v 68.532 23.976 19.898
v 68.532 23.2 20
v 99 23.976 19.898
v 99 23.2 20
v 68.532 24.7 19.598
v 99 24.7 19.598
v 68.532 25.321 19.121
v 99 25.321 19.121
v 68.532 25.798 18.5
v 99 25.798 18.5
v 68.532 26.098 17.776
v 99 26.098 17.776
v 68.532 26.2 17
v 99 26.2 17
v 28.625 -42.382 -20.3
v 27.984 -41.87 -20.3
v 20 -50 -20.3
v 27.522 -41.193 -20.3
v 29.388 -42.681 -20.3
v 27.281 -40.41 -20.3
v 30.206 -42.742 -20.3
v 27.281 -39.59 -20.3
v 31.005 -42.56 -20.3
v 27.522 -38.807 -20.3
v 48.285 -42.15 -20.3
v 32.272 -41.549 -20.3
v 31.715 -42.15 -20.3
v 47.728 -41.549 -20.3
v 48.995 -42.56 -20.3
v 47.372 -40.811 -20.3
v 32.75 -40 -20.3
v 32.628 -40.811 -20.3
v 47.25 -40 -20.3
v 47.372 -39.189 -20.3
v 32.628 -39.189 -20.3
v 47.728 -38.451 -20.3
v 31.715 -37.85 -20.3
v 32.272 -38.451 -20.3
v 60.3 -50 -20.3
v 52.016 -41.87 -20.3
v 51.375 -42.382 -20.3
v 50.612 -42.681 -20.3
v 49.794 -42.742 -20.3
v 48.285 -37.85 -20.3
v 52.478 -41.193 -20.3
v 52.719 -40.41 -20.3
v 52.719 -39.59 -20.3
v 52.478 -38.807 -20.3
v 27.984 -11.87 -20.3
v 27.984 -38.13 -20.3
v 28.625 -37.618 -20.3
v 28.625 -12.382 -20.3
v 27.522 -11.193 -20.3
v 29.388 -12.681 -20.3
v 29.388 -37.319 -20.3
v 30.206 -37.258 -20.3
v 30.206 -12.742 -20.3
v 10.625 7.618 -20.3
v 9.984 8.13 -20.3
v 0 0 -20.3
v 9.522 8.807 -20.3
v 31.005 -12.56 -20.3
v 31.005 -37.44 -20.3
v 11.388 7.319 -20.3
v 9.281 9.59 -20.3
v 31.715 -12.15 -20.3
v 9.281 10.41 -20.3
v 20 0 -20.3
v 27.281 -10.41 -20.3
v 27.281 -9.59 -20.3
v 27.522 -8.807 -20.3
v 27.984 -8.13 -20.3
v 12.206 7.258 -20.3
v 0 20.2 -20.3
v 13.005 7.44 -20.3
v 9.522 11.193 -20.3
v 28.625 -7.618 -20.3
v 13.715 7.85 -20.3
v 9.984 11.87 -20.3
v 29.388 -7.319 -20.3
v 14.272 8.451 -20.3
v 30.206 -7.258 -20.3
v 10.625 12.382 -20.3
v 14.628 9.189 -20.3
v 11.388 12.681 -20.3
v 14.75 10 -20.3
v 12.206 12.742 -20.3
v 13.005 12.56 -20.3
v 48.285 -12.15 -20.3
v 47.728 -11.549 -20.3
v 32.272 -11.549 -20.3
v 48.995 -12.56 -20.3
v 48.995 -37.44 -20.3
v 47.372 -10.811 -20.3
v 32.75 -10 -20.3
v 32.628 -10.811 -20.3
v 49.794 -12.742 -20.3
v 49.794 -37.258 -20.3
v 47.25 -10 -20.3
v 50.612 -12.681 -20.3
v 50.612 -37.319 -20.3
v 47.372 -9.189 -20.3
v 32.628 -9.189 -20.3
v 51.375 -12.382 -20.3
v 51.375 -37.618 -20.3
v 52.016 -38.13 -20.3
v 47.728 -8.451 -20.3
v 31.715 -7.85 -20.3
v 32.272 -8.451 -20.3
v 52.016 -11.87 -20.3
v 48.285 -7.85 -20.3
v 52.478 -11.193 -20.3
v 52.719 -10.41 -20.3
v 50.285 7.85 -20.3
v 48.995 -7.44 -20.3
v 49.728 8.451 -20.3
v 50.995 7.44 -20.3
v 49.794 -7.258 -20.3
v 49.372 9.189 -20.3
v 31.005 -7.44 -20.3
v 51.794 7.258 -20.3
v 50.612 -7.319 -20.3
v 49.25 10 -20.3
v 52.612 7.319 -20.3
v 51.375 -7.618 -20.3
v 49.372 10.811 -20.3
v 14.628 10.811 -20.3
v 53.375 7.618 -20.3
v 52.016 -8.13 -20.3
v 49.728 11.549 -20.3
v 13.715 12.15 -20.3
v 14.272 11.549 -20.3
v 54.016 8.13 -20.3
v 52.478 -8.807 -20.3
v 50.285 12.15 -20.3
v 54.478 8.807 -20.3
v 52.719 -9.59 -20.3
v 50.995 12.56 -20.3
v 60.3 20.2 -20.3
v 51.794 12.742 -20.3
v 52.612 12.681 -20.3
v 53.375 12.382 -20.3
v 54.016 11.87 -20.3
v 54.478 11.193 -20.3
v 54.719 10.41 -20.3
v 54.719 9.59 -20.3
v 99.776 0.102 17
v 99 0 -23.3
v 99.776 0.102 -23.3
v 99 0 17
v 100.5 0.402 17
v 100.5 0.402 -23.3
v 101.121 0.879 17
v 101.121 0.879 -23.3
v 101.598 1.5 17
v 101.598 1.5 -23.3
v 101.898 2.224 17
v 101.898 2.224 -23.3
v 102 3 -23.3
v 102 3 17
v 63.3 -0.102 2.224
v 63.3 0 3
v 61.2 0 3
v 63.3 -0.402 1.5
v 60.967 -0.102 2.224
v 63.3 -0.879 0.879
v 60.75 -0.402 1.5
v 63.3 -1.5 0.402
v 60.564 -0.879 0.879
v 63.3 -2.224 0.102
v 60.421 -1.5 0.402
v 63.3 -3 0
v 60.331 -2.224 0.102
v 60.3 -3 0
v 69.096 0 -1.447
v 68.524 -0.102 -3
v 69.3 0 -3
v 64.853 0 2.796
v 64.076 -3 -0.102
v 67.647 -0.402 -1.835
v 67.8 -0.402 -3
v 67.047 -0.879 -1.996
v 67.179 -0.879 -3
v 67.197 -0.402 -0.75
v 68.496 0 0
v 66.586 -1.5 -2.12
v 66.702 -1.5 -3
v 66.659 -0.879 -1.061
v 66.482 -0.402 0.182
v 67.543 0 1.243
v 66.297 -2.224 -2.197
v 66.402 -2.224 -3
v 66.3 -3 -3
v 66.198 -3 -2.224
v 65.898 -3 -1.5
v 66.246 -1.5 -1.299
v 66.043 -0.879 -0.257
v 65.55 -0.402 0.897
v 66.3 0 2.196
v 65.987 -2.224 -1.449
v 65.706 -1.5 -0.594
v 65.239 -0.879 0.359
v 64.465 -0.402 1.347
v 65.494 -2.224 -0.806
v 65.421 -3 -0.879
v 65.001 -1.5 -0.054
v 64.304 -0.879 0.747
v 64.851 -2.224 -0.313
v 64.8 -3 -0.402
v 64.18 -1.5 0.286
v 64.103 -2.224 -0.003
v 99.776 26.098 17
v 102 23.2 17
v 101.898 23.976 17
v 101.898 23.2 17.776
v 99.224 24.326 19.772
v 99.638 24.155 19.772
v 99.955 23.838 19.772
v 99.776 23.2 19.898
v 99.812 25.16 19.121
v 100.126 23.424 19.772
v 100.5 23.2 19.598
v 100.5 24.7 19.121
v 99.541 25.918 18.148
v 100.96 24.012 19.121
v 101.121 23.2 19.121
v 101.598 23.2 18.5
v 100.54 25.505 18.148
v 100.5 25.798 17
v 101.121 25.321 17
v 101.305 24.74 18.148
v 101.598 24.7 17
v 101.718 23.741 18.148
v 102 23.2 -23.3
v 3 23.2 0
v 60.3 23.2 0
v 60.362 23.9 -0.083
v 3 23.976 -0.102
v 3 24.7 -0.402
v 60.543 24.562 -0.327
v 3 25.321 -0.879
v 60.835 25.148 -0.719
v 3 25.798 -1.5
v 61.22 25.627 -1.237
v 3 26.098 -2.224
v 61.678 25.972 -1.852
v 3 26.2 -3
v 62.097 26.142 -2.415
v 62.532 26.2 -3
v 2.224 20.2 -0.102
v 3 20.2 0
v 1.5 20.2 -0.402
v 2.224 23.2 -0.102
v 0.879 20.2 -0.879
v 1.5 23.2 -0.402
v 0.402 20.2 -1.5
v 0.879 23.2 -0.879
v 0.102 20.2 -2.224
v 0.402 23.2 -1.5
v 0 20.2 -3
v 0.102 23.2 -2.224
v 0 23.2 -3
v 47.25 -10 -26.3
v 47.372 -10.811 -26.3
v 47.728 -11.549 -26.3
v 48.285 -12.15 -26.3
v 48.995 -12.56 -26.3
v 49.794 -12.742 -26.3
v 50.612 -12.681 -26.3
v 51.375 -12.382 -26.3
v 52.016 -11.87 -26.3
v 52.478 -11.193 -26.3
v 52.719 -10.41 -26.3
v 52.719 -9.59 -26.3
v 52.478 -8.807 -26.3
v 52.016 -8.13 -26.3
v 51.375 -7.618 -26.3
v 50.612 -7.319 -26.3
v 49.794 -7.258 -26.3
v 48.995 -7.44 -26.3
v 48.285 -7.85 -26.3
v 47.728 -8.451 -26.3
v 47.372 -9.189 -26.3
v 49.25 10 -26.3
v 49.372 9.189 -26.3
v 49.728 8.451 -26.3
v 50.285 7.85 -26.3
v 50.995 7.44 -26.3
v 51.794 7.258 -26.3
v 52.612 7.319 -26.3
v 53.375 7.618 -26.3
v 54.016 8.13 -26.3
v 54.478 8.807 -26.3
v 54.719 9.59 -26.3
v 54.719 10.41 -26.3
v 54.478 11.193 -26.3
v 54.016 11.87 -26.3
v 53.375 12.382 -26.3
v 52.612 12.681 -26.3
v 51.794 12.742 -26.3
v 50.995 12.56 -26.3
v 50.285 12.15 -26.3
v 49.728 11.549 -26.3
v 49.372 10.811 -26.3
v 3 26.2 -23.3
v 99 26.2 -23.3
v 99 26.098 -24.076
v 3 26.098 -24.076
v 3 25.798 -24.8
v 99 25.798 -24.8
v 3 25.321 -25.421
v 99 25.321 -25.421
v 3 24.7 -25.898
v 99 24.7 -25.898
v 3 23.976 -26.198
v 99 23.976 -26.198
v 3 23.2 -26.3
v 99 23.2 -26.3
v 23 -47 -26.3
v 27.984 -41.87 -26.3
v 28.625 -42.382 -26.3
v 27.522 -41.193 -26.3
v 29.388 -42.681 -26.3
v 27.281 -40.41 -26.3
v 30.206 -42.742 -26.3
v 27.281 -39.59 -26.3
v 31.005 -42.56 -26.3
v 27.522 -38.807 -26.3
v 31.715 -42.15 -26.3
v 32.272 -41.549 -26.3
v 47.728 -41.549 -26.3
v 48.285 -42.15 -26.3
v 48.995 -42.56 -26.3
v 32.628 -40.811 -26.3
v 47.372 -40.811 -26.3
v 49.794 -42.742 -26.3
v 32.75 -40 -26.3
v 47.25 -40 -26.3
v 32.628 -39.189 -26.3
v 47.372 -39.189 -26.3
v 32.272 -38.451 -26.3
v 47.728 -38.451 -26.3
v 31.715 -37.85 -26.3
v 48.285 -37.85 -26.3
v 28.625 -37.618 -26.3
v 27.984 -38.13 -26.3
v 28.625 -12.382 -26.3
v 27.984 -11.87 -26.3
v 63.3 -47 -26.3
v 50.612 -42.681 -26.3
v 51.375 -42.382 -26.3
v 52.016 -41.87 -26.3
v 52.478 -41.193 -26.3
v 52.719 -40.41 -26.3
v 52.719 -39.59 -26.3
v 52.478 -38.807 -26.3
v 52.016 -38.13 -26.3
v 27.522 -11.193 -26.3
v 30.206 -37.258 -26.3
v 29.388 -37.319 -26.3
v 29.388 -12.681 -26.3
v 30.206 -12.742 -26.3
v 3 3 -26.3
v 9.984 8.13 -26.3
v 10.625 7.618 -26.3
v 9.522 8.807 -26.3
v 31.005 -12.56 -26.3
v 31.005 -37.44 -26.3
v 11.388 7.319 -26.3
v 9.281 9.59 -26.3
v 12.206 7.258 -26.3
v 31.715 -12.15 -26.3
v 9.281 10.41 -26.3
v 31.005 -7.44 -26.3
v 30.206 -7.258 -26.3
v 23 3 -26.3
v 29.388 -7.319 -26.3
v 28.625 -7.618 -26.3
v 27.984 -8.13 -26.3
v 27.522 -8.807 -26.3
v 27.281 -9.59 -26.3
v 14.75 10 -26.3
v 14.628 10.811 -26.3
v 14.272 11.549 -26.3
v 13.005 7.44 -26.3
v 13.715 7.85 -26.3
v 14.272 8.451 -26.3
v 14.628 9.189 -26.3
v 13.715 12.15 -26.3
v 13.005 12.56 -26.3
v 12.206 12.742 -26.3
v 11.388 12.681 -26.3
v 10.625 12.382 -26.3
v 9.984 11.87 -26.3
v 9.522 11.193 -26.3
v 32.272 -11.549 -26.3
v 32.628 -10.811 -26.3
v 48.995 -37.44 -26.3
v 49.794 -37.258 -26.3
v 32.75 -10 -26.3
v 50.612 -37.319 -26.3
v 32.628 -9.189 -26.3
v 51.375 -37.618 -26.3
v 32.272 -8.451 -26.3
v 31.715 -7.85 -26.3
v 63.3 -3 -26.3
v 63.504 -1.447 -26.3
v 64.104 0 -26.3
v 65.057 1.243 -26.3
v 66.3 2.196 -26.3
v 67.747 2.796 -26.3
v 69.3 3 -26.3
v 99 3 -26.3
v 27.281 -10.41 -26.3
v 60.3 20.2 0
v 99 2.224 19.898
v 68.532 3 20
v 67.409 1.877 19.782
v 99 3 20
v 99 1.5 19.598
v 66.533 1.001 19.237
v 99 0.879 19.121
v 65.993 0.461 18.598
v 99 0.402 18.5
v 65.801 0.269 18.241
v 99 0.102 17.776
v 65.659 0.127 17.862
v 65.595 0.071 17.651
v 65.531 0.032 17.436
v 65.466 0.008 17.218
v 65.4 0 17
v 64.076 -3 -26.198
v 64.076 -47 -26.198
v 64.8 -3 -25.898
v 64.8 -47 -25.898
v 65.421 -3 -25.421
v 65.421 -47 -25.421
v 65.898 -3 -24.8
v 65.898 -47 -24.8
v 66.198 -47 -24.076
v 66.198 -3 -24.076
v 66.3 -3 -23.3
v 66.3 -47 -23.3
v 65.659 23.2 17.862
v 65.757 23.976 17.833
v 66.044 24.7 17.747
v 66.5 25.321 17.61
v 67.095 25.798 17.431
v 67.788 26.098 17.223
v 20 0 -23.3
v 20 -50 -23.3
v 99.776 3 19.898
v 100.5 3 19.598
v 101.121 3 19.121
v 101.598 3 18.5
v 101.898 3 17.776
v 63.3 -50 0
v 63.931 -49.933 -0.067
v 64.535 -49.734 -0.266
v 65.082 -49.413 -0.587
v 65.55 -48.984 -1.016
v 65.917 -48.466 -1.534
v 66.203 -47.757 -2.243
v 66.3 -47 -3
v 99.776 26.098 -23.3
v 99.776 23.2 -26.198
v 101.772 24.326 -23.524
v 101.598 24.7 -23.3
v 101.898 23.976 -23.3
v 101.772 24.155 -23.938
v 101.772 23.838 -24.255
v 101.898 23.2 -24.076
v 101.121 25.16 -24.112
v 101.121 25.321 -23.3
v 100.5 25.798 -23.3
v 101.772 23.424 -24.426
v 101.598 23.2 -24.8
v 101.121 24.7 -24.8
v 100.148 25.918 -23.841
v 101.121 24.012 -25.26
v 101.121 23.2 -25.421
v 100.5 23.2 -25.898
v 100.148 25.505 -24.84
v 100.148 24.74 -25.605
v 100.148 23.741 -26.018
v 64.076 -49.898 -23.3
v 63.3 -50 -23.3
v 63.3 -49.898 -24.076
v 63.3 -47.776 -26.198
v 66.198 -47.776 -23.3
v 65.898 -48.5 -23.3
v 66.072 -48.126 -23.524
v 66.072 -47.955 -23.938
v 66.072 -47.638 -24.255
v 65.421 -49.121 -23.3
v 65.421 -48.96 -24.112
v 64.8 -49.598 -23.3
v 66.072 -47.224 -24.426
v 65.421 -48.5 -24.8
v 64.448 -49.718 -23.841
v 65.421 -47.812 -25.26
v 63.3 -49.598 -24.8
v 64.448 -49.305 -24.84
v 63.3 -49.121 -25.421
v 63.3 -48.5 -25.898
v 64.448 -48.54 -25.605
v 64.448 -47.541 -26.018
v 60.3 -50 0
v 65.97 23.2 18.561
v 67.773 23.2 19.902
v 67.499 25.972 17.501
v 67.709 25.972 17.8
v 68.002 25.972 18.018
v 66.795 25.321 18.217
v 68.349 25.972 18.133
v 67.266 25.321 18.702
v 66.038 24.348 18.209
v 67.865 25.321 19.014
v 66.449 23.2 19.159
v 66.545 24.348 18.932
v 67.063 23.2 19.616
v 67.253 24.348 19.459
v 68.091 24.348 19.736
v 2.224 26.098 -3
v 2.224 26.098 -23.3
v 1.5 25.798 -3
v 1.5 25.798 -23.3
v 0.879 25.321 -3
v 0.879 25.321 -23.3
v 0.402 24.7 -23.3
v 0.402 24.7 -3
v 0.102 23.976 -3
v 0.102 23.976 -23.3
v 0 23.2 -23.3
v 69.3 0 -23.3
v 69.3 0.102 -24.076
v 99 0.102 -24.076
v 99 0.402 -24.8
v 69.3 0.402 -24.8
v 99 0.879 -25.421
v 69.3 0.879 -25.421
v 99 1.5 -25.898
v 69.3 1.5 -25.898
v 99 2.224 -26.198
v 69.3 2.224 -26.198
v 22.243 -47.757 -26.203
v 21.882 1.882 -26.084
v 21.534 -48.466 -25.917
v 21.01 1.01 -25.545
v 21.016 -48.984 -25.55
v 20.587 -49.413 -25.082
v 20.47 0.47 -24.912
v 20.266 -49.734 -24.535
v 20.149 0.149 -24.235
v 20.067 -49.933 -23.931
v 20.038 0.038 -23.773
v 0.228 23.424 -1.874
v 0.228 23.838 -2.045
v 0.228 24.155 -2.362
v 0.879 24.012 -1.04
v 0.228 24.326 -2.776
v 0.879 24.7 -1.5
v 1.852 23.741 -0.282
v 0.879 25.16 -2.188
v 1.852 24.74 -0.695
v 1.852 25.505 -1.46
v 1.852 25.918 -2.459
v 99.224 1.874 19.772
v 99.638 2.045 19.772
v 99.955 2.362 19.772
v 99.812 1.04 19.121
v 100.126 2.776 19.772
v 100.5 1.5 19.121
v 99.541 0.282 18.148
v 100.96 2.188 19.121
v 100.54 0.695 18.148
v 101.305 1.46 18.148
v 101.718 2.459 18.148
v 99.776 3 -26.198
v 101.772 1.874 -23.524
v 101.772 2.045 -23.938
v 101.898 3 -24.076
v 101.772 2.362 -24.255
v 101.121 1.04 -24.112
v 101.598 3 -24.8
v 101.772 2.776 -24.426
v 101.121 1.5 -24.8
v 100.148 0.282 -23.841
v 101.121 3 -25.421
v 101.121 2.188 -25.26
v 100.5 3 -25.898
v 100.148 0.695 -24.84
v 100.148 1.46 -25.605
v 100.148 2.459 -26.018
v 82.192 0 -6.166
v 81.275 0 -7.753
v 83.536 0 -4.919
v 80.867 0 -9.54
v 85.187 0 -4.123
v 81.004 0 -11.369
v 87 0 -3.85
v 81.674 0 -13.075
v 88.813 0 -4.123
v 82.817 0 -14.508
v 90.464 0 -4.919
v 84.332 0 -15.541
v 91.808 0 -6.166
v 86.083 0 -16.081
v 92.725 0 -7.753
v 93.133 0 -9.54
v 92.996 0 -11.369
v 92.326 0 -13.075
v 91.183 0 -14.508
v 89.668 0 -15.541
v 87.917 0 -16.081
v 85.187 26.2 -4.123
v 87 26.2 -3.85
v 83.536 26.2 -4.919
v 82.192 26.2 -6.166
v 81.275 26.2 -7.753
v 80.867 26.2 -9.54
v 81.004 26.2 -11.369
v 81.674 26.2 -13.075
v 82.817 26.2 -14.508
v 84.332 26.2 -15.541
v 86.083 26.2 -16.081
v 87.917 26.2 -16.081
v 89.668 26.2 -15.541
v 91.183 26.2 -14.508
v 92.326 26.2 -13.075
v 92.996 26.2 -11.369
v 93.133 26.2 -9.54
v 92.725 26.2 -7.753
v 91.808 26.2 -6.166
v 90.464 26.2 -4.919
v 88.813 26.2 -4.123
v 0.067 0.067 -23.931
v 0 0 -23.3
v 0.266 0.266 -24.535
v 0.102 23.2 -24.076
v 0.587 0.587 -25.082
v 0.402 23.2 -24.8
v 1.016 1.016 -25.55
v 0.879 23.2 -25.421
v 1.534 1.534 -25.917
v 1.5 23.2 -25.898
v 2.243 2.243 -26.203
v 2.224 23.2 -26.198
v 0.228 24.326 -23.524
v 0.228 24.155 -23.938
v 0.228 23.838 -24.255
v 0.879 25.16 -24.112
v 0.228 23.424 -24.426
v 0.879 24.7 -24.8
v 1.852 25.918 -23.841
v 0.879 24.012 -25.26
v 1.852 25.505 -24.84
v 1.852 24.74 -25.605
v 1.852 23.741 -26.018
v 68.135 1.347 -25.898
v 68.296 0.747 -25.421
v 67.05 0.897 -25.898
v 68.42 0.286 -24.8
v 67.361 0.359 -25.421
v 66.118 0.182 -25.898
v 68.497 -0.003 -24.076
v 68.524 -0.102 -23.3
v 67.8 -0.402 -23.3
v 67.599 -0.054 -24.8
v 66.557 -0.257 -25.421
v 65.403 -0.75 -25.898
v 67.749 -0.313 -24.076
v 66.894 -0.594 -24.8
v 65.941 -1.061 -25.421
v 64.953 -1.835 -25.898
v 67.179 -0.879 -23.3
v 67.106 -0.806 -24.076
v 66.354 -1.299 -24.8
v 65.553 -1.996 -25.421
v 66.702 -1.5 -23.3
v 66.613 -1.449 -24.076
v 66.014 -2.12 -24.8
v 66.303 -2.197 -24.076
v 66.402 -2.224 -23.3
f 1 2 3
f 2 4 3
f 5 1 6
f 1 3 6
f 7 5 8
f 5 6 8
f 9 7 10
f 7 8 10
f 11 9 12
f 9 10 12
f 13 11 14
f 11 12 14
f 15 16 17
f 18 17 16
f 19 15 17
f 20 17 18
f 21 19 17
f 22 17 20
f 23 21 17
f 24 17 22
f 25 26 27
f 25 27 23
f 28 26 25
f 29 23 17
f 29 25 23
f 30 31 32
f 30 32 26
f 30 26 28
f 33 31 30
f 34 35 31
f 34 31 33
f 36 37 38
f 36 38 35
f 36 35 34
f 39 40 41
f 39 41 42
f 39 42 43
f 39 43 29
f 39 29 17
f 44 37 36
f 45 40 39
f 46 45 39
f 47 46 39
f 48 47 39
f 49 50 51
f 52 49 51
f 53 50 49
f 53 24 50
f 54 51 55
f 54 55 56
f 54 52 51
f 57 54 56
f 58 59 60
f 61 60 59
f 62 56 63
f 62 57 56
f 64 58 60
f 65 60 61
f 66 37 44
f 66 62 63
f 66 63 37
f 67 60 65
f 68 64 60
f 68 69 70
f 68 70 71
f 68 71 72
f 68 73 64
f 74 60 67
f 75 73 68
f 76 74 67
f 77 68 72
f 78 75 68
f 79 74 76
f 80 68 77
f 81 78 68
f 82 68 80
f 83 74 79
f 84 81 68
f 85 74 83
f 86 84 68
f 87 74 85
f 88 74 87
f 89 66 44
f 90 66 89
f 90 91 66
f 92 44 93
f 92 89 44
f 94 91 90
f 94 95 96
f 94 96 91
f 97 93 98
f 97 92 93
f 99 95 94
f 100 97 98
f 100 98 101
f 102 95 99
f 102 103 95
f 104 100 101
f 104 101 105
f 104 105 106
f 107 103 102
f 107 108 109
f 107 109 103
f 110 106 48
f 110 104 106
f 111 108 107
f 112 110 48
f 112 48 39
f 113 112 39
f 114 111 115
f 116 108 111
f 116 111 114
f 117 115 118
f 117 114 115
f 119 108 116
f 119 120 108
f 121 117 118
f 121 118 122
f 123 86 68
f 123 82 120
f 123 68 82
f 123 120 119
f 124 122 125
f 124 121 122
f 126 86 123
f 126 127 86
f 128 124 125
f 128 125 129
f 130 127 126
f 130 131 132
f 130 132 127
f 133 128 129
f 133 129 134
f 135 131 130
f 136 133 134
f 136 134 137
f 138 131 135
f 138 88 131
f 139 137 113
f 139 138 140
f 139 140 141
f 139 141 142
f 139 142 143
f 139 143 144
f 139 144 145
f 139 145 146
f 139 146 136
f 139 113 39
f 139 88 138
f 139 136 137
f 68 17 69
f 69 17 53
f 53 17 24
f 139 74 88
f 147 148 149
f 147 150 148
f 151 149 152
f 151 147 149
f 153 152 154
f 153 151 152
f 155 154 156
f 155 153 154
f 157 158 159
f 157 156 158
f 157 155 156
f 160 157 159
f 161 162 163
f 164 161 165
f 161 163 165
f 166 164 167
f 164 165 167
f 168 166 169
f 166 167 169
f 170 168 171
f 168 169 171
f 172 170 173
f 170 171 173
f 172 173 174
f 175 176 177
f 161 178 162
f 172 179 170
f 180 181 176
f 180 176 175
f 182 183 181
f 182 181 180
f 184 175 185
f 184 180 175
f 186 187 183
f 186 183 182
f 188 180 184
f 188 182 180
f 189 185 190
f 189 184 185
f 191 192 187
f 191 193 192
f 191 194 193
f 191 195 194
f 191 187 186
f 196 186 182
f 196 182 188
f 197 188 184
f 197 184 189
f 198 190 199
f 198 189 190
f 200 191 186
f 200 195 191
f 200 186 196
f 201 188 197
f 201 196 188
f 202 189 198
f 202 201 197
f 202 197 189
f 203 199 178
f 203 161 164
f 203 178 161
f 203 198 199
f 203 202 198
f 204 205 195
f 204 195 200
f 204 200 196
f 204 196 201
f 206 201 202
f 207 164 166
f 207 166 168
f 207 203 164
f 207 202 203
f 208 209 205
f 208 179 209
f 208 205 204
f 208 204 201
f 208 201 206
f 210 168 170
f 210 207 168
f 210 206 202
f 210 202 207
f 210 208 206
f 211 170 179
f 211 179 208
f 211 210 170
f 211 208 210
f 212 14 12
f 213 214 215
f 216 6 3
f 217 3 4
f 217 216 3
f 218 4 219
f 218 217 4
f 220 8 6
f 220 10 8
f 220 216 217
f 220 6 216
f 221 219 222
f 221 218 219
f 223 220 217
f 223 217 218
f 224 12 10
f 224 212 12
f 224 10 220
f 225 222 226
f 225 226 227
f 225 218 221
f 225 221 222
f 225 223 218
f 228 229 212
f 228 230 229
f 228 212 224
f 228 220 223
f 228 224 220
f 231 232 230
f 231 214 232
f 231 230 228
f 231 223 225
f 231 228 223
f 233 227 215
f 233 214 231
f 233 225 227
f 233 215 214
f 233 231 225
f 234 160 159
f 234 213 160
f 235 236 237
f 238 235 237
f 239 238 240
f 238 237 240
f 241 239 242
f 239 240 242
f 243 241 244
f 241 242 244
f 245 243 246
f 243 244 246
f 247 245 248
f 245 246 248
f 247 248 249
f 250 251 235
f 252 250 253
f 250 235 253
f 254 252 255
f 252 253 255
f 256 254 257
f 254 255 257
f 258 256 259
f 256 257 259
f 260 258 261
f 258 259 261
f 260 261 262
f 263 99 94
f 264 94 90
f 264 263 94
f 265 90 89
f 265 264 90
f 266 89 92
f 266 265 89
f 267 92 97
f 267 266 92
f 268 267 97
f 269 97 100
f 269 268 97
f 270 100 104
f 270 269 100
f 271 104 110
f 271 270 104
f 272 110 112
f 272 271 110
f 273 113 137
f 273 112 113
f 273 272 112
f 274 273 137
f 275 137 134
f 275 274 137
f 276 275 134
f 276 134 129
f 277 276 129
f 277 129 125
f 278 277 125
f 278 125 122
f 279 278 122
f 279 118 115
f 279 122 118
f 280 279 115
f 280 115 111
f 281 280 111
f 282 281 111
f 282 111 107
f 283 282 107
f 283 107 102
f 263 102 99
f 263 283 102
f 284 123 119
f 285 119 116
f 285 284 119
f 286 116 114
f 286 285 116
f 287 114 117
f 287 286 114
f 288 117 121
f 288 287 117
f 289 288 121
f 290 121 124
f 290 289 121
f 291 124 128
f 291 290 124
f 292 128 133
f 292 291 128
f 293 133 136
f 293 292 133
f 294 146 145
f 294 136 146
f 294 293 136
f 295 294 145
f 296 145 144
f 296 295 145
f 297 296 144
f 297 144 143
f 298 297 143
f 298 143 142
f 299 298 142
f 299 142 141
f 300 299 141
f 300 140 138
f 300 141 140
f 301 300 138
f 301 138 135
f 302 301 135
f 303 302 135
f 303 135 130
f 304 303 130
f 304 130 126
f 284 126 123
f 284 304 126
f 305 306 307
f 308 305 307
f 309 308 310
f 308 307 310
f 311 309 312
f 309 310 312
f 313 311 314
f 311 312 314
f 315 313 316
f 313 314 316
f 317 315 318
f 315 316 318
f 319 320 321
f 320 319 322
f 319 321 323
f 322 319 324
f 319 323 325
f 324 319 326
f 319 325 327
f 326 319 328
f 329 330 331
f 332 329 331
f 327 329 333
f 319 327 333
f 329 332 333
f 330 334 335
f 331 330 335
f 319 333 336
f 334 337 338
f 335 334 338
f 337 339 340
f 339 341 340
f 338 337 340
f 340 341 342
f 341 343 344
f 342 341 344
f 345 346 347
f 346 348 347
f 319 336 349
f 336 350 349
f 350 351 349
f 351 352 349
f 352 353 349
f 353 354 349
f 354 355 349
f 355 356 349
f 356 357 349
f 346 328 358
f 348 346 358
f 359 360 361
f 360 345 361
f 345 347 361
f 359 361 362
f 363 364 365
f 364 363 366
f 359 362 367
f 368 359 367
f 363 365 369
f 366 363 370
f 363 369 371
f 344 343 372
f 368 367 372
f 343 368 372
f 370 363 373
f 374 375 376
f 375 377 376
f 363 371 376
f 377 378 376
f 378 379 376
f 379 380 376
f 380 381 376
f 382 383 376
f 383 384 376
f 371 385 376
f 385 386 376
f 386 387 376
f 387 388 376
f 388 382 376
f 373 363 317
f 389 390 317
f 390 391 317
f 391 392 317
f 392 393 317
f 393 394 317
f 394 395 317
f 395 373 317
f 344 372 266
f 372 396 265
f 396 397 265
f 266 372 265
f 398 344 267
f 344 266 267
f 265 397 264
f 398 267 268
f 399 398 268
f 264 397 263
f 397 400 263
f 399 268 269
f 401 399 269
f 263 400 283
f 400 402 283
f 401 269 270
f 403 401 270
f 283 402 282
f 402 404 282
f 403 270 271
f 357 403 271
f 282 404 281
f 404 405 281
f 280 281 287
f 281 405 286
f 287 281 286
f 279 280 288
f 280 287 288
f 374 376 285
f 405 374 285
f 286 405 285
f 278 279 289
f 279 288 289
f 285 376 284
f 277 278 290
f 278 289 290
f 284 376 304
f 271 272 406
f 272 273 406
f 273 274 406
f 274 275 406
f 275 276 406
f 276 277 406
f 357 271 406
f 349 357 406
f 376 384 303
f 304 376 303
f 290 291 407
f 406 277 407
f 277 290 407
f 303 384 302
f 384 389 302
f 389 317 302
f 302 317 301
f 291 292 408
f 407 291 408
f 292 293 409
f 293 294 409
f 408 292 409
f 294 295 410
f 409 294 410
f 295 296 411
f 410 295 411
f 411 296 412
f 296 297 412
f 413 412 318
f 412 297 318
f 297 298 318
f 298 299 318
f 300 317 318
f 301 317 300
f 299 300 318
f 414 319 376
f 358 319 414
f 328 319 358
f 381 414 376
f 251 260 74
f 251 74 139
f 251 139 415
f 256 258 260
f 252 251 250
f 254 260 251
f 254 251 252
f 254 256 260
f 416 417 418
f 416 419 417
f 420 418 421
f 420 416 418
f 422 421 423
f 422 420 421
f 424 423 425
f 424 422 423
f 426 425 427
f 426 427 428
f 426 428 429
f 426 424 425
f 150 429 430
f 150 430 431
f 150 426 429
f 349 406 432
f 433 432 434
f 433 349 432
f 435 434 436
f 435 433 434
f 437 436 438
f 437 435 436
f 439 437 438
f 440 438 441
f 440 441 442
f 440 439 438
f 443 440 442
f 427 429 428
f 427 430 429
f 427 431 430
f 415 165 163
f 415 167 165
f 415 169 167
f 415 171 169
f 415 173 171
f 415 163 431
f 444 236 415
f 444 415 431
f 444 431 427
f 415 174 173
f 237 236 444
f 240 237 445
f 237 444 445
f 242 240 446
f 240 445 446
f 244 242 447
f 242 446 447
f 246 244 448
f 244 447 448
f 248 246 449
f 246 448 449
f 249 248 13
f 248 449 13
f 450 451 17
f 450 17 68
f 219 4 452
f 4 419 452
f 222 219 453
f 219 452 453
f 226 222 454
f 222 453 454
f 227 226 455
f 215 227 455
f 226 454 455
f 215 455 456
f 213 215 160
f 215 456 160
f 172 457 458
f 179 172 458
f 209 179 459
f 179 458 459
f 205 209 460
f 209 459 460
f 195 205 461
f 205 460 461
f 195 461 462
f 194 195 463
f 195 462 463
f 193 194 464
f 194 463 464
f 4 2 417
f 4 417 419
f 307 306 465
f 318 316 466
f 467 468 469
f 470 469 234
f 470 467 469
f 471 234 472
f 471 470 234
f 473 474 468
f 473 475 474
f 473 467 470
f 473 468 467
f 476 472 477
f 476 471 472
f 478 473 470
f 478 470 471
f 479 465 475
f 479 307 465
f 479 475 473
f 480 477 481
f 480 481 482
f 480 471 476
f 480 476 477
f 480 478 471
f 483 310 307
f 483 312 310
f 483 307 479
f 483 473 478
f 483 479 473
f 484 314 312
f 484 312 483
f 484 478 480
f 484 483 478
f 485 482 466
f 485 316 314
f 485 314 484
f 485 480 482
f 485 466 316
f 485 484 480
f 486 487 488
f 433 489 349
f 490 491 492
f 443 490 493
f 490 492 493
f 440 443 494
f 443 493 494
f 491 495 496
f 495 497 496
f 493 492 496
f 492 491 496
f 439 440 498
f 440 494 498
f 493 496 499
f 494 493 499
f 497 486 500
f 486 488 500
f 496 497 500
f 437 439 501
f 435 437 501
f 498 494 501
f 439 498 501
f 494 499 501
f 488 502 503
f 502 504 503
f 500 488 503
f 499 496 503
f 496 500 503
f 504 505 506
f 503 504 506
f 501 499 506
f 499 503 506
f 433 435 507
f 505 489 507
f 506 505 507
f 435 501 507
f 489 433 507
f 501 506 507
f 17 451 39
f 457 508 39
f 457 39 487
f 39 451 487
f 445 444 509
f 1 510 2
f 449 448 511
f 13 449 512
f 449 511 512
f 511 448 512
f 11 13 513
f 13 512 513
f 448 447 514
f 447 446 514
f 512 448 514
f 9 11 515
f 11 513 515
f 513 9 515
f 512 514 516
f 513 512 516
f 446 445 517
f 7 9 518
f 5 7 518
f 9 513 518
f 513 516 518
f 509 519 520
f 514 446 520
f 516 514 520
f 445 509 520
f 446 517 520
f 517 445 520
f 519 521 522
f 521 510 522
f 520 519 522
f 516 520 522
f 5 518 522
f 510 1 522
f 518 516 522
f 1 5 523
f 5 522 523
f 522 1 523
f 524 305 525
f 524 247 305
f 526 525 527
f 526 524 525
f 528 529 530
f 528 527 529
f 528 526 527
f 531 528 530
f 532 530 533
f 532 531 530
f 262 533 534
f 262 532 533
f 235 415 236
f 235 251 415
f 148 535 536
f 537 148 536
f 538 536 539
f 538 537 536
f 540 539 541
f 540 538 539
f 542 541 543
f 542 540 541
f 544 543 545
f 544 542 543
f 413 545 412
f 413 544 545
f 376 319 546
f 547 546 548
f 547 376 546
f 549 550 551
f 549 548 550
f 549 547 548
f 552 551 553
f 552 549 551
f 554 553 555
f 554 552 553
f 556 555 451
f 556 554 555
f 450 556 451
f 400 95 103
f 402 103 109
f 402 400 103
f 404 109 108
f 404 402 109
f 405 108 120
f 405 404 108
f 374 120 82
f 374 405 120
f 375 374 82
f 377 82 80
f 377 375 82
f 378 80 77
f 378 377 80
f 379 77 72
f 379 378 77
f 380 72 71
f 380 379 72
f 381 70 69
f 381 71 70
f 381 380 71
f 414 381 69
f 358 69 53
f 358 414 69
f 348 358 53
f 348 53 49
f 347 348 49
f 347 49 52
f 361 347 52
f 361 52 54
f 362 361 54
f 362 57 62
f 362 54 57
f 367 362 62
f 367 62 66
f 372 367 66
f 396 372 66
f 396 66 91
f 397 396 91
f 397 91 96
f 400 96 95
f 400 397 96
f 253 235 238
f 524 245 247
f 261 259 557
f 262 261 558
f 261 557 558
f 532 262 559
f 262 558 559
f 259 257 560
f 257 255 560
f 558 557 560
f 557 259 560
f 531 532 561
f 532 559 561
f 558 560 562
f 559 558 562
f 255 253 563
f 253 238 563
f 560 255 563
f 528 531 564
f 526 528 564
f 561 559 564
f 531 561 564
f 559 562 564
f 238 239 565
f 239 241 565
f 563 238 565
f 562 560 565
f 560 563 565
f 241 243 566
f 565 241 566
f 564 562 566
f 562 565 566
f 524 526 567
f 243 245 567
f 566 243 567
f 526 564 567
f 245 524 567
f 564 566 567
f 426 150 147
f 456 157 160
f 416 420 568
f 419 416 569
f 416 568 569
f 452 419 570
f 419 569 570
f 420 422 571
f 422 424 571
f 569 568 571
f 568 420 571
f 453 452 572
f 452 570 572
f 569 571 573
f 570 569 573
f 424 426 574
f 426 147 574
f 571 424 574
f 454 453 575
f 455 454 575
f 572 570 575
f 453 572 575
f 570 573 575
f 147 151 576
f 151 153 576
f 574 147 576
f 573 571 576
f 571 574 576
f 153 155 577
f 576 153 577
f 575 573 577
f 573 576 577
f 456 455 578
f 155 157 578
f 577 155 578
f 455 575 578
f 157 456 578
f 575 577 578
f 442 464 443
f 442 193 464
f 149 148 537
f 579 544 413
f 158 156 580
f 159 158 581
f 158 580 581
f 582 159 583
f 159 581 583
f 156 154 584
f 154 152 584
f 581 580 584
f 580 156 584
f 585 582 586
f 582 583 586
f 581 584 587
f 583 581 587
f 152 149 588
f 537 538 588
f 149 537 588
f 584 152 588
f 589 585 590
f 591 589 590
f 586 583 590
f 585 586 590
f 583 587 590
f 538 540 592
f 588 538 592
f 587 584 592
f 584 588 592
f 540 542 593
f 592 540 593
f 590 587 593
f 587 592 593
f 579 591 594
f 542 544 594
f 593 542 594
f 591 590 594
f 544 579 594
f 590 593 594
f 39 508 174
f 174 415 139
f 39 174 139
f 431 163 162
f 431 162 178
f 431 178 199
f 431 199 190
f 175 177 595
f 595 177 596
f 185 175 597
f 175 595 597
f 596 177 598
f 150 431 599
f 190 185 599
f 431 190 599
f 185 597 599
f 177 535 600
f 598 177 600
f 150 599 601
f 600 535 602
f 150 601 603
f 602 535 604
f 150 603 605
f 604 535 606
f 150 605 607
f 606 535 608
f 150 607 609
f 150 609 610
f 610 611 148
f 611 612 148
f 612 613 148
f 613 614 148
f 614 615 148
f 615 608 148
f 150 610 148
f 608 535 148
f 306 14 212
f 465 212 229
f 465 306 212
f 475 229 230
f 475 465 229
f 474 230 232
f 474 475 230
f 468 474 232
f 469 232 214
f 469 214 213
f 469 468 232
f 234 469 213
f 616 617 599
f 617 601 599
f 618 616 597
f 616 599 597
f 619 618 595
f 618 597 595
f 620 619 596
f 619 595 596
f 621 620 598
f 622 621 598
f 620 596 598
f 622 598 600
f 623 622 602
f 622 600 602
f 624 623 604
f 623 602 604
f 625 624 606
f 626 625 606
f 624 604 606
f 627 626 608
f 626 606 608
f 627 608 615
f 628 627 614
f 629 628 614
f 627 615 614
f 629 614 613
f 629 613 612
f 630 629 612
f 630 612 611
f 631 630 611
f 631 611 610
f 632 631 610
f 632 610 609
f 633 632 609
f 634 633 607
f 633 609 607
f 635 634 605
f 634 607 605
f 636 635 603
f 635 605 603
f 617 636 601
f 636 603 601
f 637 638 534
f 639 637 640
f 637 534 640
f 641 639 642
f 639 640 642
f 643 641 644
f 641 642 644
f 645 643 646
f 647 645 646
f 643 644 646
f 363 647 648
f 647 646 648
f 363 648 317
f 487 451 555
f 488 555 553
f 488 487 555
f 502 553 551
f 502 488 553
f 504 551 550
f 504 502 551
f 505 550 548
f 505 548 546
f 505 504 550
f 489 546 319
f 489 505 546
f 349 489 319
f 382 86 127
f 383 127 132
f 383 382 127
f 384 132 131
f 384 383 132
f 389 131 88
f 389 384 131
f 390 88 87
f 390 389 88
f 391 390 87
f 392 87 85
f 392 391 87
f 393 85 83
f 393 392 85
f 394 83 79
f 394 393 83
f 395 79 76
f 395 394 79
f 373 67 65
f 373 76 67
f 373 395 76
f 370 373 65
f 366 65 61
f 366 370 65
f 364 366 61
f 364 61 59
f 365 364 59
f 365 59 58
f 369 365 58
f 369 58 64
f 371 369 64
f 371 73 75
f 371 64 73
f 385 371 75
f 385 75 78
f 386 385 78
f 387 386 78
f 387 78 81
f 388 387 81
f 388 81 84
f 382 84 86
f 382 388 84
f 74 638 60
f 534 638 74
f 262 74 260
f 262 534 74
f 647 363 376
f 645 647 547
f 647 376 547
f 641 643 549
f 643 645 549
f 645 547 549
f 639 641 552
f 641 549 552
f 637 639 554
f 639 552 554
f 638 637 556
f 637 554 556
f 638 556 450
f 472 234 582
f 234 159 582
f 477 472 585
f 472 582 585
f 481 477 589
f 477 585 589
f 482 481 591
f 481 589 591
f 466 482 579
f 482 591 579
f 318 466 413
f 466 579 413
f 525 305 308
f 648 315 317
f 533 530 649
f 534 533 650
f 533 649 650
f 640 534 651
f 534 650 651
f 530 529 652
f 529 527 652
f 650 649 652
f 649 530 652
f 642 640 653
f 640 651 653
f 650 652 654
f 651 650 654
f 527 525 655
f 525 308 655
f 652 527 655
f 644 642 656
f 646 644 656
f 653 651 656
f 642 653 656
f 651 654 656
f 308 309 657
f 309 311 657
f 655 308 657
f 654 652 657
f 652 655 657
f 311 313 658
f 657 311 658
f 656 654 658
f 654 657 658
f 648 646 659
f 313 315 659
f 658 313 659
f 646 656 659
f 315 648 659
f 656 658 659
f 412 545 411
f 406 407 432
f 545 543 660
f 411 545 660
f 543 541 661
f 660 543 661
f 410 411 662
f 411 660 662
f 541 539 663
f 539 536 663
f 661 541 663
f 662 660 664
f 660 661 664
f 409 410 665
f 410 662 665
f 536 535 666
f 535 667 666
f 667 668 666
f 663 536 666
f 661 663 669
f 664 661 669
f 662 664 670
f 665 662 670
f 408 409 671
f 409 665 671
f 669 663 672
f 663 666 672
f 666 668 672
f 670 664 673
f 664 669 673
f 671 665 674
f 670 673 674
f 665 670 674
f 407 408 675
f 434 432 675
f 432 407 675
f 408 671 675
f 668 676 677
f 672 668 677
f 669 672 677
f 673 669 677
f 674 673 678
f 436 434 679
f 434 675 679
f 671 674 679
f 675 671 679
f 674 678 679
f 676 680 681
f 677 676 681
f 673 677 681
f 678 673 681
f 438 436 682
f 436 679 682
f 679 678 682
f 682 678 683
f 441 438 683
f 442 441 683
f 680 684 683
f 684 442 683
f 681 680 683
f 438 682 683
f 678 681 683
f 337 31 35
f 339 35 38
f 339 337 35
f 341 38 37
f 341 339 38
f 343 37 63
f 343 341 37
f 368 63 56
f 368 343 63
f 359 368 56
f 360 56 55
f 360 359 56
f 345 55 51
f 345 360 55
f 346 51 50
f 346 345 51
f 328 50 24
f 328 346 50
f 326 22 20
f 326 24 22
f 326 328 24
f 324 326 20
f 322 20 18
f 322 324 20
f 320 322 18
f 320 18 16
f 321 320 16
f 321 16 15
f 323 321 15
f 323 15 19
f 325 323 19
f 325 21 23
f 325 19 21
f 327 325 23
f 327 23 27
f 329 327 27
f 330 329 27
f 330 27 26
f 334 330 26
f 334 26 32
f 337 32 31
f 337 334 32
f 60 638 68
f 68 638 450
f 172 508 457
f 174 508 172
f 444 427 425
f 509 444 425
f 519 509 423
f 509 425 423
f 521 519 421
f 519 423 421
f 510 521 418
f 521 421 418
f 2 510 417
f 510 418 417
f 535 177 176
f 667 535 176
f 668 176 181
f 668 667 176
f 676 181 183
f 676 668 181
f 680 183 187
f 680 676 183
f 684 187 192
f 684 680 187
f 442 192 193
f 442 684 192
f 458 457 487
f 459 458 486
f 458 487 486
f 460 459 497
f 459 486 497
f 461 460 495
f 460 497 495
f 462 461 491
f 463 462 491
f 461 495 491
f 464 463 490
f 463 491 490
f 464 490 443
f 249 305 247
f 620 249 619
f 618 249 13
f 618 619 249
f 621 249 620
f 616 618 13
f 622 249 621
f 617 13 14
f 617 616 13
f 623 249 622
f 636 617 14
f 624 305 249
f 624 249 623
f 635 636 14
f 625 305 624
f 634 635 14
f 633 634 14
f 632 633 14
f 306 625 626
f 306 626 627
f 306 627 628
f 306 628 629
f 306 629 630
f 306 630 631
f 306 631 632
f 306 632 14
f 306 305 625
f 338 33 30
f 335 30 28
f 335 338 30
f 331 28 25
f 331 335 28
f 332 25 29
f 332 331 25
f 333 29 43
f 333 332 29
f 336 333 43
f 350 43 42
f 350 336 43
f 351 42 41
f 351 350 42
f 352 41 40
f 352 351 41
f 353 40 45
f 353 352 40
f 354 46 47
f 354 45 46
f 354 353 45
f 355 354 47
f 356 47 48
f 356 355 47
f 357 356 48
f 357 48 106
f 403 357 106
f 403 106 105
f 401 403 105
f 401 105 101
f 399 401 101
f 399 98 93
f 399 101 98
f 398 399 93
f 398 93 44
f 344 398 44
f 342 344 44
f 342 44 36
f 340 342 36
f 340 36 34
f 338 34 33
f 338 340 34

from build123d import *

# Parameters (mm, degrees)
SKETCH1_W                            = 102
SKETCH1_H                            = 26.3
SKETCH1_R                            = 6.15
BASE_DEPTH                           = 20.2
BACKSIDE_SURFACE_1_REACH             = 109.255
SKETCH2_W                            = 60.3
SKETCH2_H                            = 20.3
BACKSIDE_SURFACE_1_DIRECTION_2_DEPTH = 108.255442752
SKETCH4_W                            = 6
SKETCH4_H                            = 26.3
LEG_DEPTH                            = 50
SKETCH5_W                            = 26.3
SKETCH5_H                            = 6
ROOF_DEPTH                           = 102
SKETCH6_R                            = 6.15
HOLE_FOR_LINEAR_ROD_DEPTH            = 26.2
SKETCH9_W                            = 35.7
SKETCH9_H                            = 20
BOSS_EXTRUDE5_DEPTH                  = 26.2
SKETCH7_W                            = 40.3
SKETCH7_H                            = 50
BACKSIDE_SURFACE_2_DEPTH             = 6
BOLT_HOLES_REACH                     = 124.669
SKETCH3_R                            = 2.75
CHAMFER1_SIZE                        = 6
CHAMFER1_SIZE_2                      = 20
FILLET1_R                            = 3


with BuildPart() as part:
    # Sketch1 → base (new body)
    with BuildSketch(Plane(origin=(0, 0, 0), x_dir=(1, 0, 0), z_dir=(0, 1, 0))):
        with Locations((51, 13.15)):
            Rectangle(SKETCH1_W, SKETCH1_H)
        with Locations(Location((87, 10, 0), (0, 0, 270))):
            Circle(SKETCH1_R, mode=Mode.SUBTRACT)
    extrude(amount=BASE_DEPTH)

    # Sketch2 → backside surface 1 (cut, up to next)
    with BuildSketch(Plane(origin=(0, 20.2, 0), x_dir=(1, 0, 0), z_dir=(0, 1, 0)), mode=Mode.PRIVATE) as backside_surface_1_sk1:
        with Locations((30.15, 10.15)):
            Rectangle(SKETCH2_W, SKETCH2_H)
    backside_surface_1_tool1 = extrude(backside_surface_1_sk1.sketch, amount=-BACKSIDE_SURFACE_1_REACH, mode=Mode.PRIVATE) & part.part
    add(backside_surface_1_tool1.solids().sort_by_distance((30.15, 20.2, -10.15))[0], mode=Mode.SUBTRACT)

    # Sketch2 → backside surface 1 direction 2 (cut)
    with BuildSketch(Plane(origin=(0, 20.2, 0), x_dir=(1, 0, 0), z_dir=(0, 1, 0))):
        with Locations((30.15, 10.15)):
            Rectangle(SKETCH2_W, SKETCH2_H)
    extrude(amount=BACKSIDE_SURFACE_1_DIRECTION_2_DEPTH, mode=Mode.SUBTRACT)

    # Sketch4 → leg (add)
    with BuildSketch(Plane(origin=(0, 0, 0), x_dir=(1, 0, 0), z_dir=(0, 1, 0))):
        with Locations((63.3, 13.15)):
            Rectangle(SKETCH4_W, SKETCH4_H)
    extrude(amount=-LEG_DEPTH)

    # Sketch5 → roof (add)
    with BuildSketch(Plane.ZY):
        with Locations((-13.15, 23.2)):
            Rectangle(SKETCH5_W, SKETCH5_H)
    extrude(amount=-ROOF_DEPTH)

    # Sketch6 → hole for linear rod (cut)
    with BuildSketch(Plane.XZ):
        with Locations(Location((87, -10, 0), (0, 0, 90))):
            Circle(SKETCH6_R)
    extrude(amount=-HOLE_FOR_LINEAR_ROD_DEPTH, mode=Mode.SUBTRACT)

    # Sketch9 → Boss-Extrude5 (add)
    with BuildSketch(Plane(origin=(0, 26.2, 0), x_dir=(1, 0, 0), z_dir=(0, 1, 0))):
        with Locations((84.15, -10)):
            Rectangle(SKETCH9_W, SKETCH9_H)
    extrude(amount=-BOSS_EXTRUDE5_DEPTH)

    # Sketch7 → backside surface 2 (add)
    with BuildSketch(Plane.XY.offset(-26.3)):
        with Locations((40.15, -25)):
            Rectangle(SKETCH7_W, SKETCH7_H)
    extrude(amount=BACKSIDE_SURFACE_2_DEPTH)

    # Sketch3 → bolt holes (cut, up to next)
    with BuildSketch(Plane.XY.offset(-26.3), mode=Mode.PRIVATE) as bolt_holes_sk1:
        with Locations((12, 10)):
            Circle(SKETCH3_R)
    bolt_holes_tool1 = extrude(bolt_holes_sk1.sketch, amount=BOLT_HOLES_REACH, mode=Mode.PRIVATE) & part.part
    # Sketch3 → bolt holes (cut, up to next)
    with BuildSketch(Plane.XY.offset(-26.3), mode=Mode.PRIVATE) as bolt_holes_sk2:
        with Locations(Location((52, 10, 0), (0, 0, 180))):
            Circle(SKETCH3_R)
    bolt_holes_tool2 = extrude(bolt_holes_sk2.sketch, amount=BOLT_HOLES_REACH, mode=Mode.PRIVATE) & part.part
    # Sketch3 → bolt holes (cut, up to next)
    with BuildSketch(Plane.XY.offset(-26.3), mode=Mode.PRIVATE) as bolt_holes_sk3:
        with Locations((30, -10)):
            Circle(SKETCH3_R)
    bolt_holes_tool3 = extrude(bolt_holes_sk3.sketch, amount=BOLT_HOLES_REACH, mode=Mode.PRIVATE) & part.part
    # Sketch3 → bolt holes (cut, up to next)
    with BuildSketch(Plane.XY.offset(-26.3), mode=Mode.PRIVATE) as bolt_holes_sk4:
        with Locations((30, -40)):
            Circle(SKETCH3_R)
    bolt_holes_tool4 = extrude(bolt_holes_sk4.sketch, amount=BOLT_HOLES_REACH, mode=Mode.PRIVATE) & part.part
    # Sketch3 → bolt holes (cut, up to next)
    with BuildSketch(Plane.XY.offset(-26.3), mode=Mode.PRIVATE) as bolt_holes_sk5:
        with Locations(Location((50, -40, 0), (0, 0, 180))):
            Circle(SKETCH3_R)
    bolt_holes_tool5 = extrude(bolt_holes_sk5.sketch, amount=BOLT_HOLES_REACH, mode=Mode.PRIVATE) & part.part
    # Sketch3 → bolt holes (cut, up to next)
    with BuildSketch(Plane.XY.offset(-26.3), mode=Mode.PRIVATE) as bolt_holes_sk6:
        with Locations(Location((50, -10, 0), (0, 0, 180))):
            Circle(SKETCH3_R)
    bolt_holes_tool6 = extrude(bolt_holes_sk6.sketch, amount=BOLT_HOLES_REACH, mode=Mode.PRIVATE) & part.part
    add(bolt_holes_tool1.solids().sort_by_distance((12, 10, -26.3))[0], mode=Mode.SUBTRACT)
    add(bolt_holes_tool2.solids().sort_by_distance((52, 10, -26.3))[0], mode=Mode.SUBTRACT)
    add(bolt_holes_tool3.solids().sort_by_distance((30, -10, -26.3))[0], mode=Mode.SUBTRACT)
    add(bolt_holes_tool4.solids().sort_by_distance((30, -40, -26.3))[0], mode=Mode.SUBTRACT)
    add(bolt_holes_tool5.solids().sort_by_distance((50, -40, -26.3))[0], mode=Mode.SUBTRACT)
    add(bolt_holes_tool6.solids().sort_by_distance((50, -10, -26.3))[0], mode=Mode.SUBTRACT)

    # Chamfer1
    # the kernel refuses this chamfer: 20, 6 mm, written as the material it adds along each edge
    with BuildSketch(Plane(origin=(66.3, 26.2, 0), x_dir=(-0.9925205348140392, 0, -0.12207779475585914), z_dir=(0, -1, 0))) as chamfer1_piece_1:
        Polygon((CHAMFER1_SIZE * 0.992520534814, -CHAMFER1_SIZE * 0.122077794756), (-CHAMFER1_SIZE_2 * 0.122077794756, -CHAMFER1_SIZE_2 * 0.992520534814), (0, 0), align=None)
    extrude(amount=26.2)

    # Fillet1
    fillet1_edges = [part.edges().sort_by_distance(p)[0] for p in [
        (30.15, 26.2, 0),
        (63.3, 0, 0),
        (63.3, 26.2, 10),
        (43.15, -50, -26.3),
        (66.3, -50, -13.15),
        (66.3, -25, -26.3),
        (66.3, -25, 0),
        (66.3, 0, -13.15),
        (84.15, 0, -26.3),
        (102, 0, -3.15),
        (51, 26.2, -26.3),
        (0, 23.2, 0),
        (0, 26.2, -13.15),
        (102, 26.2, -3.15),
        (84.15, 26.2, 20),
        (84.15, 0, 20),
        (102, 13.1, 20),
        (66.3, 13.1, 20),
        (0, 13.1, -26.3),
        (102, 13.1, -26.3),
        (10, 0, -26.3),
        (20, -25, -26.3),
    ]]
    fillet(fillet1_edges, radius=FILLET1_R)


solid = part.part
